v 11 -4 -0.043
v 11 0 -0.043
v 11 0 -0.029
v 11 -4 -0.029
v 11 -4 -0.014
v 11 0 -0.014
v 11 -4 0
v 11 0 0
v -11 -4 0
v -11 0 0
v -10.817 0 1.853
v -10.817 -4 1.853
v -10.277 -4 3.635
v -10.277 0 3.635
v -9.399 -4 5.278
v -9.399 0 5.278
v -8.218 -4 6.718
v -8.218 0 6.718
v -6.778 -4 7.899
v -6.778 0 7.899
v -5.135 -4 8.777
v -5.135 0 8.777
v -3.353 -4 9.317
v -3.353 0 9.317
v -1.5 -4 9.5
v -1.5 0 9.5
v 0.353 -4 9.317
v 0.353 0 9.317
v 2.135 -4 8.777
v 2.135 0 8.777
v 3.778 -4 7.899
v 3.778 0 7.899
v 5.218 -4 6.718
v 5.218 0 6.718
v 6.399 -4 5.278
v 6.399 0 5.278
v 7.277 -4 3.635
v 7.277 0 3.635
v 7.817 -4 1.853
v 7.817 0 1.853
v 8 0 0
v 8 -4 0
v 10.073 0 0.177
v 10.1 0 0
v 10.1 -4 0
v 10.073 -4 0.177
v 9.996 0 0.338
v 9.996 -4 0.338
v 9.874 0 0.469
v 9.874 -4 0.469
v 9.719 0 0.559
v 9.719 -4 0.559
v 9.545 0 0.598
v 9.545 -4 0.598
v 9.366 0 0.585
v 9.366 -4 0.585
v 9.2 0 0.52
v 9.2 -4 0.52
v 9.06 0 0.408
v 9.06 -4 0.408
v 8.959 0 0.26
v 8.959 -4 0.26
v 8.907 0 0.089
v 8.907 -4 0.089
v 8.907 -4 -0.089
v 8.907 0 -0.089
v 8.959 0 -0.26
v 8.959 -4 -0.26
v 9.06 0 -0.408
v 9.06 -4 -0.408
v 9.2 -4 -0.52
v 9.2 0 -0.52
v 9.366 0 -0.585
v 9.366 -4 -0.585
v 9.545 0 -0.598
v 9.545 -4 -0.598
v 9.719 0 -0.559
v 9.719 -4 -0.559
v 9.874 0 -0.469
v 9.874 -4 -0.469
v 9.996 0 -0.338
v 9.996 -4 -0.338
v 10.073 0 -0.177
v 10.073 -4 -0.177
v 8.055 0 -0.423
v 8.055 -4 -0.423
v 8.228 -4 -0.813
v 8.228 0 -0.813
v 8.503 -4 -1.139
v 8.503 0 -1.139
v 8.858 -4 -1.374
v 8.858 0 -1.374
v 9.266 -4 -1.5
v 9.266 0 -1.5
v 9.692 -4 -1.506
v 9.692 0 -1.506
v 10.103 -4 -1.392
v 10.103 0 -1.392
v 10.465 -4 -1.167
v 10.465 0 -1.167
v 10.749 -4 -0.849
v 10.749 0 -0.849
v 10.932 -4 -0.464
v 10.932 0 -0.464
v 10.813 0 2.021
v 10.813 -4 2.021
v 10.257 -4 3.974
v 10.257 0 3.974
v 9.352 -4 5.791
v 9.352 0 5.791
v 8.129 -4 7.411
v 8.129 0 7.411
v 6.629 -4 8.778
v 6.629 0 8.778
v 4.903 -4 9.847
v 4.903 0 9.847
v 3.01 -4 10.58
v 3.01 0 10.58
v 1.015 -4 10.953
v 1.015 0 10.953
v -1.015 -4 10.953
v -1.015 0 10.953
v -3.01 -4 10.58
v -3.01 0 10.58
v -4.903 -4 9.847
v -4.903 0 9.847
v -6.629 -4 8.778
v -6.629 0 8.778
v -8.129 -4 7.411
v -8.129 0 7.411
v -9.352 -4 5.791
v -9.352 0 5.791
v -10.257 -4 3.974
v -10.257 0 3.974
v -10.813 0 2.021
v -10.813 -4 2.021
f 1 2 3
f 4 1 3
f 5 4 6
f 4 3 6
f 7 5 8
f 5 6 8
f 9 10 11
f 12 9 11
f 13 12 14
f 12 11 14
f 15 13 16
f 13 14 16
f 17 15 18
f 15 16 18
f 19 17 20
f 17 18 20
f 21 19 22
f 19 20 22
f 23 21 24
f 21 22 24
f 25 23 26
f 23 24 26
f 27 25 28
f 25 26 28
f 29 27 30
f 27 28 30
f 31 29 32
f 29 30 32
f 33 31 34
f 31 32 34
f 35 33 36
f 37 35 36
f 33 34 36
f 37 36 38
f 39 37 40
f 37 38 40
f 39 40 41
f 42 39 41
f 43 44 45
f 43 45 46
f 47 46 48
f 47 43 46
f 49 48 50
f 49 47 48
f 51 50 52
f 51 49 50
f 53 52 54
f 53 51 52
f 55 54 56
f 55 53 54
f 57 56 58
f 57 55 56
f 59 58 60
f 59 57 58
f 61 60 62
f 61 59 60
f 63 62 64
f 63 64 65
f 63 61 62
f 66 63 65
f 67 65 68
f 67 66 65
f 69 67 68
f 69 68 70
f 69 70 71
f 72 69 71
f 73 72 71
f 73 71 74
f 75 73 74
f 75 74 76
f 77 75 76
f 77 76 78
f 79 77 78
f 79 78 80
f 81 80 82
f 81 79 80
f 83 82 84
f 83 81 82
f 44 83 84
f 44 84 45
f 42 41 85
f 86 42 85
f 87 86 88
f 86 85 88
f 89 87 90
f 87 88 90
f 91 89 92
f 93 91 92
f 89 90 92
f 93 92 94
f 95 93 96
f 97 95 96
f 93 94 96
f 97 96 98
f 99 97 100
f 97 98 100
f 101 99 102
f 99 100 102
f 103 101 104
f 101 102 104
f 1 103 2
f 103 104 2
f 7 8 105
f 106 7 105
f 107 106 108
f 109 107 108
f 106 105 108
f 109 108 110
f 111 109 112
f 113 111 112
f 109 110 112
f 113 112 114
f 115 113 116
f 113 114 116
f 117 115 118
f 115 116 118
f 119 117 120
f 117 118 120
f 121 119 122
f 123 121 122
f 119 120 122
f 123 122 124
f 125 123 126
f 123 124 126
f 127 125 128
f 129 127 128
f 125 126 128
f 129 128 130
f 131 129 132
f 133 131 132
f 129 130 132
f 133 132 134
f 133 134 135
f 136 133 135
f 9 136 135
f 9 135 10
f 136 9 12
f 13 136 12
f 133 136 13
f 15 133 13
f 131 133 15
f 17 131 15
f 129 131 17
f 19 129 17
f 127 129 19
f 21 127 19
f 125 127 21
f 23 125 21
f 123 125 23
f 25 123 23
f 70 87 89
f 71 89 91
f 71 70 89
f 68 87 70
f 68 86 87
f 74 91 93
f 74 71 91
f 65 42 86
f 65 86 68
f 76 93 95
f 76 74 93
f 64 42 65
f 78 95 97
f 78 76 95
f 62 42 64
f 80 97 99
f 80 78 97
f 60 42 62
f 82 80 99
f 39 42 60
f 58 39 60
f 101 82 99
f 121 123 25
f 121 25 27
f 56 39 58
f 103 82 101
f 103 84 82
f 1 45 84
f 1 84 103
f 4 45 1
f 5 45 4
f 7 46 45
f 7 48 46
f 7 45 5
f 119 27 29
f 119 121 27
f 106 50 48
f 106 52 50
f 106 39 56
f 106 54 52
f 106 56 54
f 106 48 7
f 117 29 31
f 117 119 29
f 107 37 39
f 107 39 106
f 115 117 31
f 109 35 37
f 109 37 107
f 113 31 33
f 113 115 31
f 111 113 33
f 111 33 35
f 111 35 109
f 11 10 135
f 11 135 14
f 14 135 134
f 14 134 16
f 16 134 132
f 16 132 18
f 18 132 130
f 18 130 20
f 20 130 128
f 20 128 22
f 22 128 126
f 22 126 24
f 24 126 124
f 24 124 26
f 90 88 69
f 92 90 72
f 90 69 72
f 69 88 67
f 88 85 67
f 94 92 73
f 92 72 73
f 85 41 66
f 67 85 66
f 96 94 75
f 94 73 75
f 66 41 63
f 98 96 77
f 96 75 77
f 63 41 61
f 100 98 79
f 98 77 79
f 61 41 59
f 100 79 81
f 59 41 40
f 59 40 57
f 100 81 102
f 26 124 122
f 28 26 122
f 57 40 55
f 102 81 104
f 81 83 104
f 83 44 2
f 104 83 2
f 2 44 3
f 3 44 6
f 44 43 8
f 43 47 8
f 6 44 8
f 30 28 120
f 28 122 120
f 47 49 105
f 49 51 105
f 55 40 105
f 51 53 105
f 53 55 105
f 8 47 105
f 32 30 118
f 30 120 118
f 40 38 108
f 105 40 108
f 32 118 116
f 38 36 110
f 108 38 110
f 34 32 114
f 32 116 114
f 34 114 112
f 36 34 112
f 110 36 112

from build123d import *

# Parameters (mm, degrees)
F0_R     = 0.6
F1_DEPTH = 4


with BuildPart() as f1:
    # F0 (on Front) → F1 (new body)
    with BuildSketch(Plane.XZ):
        with BuildLine():
            ThreePointArc((8, 0), (9.478575, -1.518464), (10.999917, -0.042849))
            ThreePointArc((10.999917, -0.042849), (10.999979, -0.021425), (11, 0))
            ThreePointArc((11, 0), (0, 11), (-11, 0))
            ThreePointArc((-11, 0), (-1.5, 9.5), (8, 0))
        make_face()
        with Locations((9.5, 0)):
            Circle(F0_R, mode=Mode.SUBTRACT)
    extrude(amount=F1_DEPTH)


solid = f1.part
